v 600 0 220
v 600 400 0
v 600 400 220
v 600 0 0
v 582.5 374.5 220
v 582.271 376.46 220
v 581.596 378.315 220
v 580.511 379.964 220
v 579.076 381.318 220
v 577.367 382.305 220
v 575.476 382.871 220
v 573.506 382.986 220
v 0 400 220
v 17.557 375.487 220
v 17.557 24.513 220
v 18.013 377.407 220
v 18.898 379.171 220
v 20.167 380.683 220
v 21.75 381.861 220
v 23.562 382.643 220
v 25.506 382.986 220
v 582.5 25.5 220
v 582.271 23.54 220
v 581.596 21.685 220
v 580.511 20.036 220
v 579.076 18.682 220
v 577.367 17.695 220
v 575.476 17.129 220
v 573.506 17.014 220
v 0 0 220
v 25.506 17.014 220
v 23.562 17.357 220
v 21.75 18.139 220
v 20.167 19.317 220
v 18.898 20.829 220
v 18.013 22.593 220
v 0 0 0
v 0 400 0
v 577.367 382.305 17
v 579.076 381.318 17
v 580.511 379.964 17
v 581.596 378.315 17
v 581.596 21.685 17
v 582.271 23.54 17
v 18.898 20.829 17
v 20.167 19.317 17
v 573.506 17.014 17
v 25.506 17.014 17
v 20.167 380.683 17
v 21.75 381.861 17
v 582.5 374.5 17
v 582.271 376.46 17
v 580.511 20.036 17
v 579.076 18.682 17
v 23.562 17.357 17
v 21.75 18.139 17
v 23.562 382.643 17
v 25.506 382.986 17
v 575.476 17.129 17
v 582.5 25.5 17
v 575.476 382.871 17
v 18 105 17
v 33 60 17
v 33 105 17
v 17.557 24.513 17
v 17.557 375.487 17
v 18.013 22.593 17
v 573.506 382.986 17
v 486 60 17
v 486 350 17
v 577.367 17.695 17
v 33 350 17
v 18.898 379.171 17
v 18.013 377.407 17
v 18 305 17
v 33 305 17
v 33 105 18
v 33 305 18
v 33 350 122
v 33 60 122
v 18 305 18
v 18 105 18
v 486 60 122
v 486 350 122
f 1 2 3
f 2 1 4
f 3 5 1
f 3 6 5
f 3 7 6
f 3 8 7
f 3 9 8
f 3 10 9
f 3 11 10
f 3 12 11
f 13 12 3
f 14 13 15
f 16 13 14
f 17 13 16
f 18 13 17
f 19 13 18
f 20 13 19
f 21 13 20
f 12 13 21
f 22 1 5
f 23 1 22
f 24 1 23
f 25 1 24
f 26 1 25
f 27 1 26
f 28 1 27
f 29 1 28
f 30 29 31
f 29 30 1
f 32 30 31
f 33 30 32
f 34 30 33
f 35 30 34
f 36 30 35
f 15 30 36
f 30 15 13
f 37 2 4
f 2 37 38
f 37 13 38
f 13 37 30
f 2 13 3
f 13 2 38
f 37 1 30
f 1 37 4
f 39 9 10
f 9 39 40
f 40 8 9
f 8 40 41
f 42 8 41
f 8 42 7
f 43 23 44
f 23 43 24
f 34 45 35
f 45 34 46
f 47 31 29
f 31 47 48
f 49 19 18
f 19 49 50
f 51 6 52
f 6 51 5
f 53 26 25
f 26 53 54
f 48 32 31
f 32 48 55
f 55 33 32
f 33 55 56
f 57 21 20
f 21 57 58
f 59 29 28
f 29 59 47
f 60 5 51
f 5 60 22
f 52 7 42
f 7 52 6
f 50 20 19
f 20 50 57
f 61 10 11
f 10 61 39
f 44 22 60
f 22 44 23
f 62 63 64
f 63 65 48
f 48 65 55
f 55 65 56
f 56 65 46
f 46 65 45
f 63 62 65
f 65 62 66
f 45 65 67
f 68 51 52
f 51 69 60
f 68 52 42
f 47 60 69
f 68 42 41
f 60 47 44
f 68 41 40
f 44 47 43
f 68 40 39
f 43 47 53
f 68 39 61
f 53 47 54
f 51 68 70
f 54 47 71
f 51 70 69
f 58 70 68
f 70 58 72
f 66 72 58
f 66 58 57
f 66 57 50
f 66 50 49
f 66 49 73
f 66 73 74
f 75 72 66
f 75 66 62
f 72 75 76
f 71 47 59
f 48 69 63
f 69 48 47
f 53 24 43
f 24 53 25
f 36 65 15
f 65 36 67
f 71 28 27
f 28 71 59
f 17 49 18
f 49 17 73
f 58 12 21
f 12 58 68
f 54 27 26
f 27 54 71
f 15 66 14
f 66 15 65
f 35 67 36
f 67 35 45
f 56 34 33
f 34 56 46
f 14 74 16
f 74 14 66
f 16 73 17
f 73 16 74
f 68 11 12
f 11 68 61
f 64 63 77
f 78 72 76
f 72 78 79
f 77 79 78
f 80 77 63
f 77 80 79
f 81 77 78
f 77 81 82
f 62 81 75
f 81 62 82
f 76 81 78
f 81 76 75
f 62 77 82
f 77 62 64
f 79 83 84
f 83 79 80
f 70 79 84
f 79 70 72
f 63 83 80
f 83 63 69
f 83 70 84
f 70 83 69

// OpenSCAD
euroboxInnerHeight = 220-203;

module eurobox(){
    // EG 64/22 WB
    
    outer = [600, 400, 220];
    inner = [565, 366, 203]; // x+y gemessen und 2mm Toleranz abgezogen
    innerRadius = 8.5; // grob gemessen
    
    color("grey")
    difference(){
        cube(outer);
        
        translate([(outer.x-(inner.x-innerRadius*2))/2, (outer.y-(inner.y-innerRadius*2))/2, outer.z-inner.z])
            linear_extrude(inner.z+1)
                minkowski(){
                    square([inner.x - innerRadius*2, inner.y - innerRadius*2]);
                    circle(r=innerRadius);
                }
                
    }
}

module inverter(){
    tabSize = [15, 200, 1];
    inverterSize = [423, 290, 105];
    
    union(){
        translate([0, inverterSize.y/2 - tabSize.y/2, 0])
            cube(tabSize);
        translate([tabSize.x, 0, 0])
            cube(inverterSize);
        color("red", 0.2)
            translate([tabSize.x + inverterSize.x, 0, 0])
            cube([30, inverterSize.y, inverterSize.z]);
    }
}

eurobox();

translate([18, 60, euroboxInnerHeight])
    inverter();
